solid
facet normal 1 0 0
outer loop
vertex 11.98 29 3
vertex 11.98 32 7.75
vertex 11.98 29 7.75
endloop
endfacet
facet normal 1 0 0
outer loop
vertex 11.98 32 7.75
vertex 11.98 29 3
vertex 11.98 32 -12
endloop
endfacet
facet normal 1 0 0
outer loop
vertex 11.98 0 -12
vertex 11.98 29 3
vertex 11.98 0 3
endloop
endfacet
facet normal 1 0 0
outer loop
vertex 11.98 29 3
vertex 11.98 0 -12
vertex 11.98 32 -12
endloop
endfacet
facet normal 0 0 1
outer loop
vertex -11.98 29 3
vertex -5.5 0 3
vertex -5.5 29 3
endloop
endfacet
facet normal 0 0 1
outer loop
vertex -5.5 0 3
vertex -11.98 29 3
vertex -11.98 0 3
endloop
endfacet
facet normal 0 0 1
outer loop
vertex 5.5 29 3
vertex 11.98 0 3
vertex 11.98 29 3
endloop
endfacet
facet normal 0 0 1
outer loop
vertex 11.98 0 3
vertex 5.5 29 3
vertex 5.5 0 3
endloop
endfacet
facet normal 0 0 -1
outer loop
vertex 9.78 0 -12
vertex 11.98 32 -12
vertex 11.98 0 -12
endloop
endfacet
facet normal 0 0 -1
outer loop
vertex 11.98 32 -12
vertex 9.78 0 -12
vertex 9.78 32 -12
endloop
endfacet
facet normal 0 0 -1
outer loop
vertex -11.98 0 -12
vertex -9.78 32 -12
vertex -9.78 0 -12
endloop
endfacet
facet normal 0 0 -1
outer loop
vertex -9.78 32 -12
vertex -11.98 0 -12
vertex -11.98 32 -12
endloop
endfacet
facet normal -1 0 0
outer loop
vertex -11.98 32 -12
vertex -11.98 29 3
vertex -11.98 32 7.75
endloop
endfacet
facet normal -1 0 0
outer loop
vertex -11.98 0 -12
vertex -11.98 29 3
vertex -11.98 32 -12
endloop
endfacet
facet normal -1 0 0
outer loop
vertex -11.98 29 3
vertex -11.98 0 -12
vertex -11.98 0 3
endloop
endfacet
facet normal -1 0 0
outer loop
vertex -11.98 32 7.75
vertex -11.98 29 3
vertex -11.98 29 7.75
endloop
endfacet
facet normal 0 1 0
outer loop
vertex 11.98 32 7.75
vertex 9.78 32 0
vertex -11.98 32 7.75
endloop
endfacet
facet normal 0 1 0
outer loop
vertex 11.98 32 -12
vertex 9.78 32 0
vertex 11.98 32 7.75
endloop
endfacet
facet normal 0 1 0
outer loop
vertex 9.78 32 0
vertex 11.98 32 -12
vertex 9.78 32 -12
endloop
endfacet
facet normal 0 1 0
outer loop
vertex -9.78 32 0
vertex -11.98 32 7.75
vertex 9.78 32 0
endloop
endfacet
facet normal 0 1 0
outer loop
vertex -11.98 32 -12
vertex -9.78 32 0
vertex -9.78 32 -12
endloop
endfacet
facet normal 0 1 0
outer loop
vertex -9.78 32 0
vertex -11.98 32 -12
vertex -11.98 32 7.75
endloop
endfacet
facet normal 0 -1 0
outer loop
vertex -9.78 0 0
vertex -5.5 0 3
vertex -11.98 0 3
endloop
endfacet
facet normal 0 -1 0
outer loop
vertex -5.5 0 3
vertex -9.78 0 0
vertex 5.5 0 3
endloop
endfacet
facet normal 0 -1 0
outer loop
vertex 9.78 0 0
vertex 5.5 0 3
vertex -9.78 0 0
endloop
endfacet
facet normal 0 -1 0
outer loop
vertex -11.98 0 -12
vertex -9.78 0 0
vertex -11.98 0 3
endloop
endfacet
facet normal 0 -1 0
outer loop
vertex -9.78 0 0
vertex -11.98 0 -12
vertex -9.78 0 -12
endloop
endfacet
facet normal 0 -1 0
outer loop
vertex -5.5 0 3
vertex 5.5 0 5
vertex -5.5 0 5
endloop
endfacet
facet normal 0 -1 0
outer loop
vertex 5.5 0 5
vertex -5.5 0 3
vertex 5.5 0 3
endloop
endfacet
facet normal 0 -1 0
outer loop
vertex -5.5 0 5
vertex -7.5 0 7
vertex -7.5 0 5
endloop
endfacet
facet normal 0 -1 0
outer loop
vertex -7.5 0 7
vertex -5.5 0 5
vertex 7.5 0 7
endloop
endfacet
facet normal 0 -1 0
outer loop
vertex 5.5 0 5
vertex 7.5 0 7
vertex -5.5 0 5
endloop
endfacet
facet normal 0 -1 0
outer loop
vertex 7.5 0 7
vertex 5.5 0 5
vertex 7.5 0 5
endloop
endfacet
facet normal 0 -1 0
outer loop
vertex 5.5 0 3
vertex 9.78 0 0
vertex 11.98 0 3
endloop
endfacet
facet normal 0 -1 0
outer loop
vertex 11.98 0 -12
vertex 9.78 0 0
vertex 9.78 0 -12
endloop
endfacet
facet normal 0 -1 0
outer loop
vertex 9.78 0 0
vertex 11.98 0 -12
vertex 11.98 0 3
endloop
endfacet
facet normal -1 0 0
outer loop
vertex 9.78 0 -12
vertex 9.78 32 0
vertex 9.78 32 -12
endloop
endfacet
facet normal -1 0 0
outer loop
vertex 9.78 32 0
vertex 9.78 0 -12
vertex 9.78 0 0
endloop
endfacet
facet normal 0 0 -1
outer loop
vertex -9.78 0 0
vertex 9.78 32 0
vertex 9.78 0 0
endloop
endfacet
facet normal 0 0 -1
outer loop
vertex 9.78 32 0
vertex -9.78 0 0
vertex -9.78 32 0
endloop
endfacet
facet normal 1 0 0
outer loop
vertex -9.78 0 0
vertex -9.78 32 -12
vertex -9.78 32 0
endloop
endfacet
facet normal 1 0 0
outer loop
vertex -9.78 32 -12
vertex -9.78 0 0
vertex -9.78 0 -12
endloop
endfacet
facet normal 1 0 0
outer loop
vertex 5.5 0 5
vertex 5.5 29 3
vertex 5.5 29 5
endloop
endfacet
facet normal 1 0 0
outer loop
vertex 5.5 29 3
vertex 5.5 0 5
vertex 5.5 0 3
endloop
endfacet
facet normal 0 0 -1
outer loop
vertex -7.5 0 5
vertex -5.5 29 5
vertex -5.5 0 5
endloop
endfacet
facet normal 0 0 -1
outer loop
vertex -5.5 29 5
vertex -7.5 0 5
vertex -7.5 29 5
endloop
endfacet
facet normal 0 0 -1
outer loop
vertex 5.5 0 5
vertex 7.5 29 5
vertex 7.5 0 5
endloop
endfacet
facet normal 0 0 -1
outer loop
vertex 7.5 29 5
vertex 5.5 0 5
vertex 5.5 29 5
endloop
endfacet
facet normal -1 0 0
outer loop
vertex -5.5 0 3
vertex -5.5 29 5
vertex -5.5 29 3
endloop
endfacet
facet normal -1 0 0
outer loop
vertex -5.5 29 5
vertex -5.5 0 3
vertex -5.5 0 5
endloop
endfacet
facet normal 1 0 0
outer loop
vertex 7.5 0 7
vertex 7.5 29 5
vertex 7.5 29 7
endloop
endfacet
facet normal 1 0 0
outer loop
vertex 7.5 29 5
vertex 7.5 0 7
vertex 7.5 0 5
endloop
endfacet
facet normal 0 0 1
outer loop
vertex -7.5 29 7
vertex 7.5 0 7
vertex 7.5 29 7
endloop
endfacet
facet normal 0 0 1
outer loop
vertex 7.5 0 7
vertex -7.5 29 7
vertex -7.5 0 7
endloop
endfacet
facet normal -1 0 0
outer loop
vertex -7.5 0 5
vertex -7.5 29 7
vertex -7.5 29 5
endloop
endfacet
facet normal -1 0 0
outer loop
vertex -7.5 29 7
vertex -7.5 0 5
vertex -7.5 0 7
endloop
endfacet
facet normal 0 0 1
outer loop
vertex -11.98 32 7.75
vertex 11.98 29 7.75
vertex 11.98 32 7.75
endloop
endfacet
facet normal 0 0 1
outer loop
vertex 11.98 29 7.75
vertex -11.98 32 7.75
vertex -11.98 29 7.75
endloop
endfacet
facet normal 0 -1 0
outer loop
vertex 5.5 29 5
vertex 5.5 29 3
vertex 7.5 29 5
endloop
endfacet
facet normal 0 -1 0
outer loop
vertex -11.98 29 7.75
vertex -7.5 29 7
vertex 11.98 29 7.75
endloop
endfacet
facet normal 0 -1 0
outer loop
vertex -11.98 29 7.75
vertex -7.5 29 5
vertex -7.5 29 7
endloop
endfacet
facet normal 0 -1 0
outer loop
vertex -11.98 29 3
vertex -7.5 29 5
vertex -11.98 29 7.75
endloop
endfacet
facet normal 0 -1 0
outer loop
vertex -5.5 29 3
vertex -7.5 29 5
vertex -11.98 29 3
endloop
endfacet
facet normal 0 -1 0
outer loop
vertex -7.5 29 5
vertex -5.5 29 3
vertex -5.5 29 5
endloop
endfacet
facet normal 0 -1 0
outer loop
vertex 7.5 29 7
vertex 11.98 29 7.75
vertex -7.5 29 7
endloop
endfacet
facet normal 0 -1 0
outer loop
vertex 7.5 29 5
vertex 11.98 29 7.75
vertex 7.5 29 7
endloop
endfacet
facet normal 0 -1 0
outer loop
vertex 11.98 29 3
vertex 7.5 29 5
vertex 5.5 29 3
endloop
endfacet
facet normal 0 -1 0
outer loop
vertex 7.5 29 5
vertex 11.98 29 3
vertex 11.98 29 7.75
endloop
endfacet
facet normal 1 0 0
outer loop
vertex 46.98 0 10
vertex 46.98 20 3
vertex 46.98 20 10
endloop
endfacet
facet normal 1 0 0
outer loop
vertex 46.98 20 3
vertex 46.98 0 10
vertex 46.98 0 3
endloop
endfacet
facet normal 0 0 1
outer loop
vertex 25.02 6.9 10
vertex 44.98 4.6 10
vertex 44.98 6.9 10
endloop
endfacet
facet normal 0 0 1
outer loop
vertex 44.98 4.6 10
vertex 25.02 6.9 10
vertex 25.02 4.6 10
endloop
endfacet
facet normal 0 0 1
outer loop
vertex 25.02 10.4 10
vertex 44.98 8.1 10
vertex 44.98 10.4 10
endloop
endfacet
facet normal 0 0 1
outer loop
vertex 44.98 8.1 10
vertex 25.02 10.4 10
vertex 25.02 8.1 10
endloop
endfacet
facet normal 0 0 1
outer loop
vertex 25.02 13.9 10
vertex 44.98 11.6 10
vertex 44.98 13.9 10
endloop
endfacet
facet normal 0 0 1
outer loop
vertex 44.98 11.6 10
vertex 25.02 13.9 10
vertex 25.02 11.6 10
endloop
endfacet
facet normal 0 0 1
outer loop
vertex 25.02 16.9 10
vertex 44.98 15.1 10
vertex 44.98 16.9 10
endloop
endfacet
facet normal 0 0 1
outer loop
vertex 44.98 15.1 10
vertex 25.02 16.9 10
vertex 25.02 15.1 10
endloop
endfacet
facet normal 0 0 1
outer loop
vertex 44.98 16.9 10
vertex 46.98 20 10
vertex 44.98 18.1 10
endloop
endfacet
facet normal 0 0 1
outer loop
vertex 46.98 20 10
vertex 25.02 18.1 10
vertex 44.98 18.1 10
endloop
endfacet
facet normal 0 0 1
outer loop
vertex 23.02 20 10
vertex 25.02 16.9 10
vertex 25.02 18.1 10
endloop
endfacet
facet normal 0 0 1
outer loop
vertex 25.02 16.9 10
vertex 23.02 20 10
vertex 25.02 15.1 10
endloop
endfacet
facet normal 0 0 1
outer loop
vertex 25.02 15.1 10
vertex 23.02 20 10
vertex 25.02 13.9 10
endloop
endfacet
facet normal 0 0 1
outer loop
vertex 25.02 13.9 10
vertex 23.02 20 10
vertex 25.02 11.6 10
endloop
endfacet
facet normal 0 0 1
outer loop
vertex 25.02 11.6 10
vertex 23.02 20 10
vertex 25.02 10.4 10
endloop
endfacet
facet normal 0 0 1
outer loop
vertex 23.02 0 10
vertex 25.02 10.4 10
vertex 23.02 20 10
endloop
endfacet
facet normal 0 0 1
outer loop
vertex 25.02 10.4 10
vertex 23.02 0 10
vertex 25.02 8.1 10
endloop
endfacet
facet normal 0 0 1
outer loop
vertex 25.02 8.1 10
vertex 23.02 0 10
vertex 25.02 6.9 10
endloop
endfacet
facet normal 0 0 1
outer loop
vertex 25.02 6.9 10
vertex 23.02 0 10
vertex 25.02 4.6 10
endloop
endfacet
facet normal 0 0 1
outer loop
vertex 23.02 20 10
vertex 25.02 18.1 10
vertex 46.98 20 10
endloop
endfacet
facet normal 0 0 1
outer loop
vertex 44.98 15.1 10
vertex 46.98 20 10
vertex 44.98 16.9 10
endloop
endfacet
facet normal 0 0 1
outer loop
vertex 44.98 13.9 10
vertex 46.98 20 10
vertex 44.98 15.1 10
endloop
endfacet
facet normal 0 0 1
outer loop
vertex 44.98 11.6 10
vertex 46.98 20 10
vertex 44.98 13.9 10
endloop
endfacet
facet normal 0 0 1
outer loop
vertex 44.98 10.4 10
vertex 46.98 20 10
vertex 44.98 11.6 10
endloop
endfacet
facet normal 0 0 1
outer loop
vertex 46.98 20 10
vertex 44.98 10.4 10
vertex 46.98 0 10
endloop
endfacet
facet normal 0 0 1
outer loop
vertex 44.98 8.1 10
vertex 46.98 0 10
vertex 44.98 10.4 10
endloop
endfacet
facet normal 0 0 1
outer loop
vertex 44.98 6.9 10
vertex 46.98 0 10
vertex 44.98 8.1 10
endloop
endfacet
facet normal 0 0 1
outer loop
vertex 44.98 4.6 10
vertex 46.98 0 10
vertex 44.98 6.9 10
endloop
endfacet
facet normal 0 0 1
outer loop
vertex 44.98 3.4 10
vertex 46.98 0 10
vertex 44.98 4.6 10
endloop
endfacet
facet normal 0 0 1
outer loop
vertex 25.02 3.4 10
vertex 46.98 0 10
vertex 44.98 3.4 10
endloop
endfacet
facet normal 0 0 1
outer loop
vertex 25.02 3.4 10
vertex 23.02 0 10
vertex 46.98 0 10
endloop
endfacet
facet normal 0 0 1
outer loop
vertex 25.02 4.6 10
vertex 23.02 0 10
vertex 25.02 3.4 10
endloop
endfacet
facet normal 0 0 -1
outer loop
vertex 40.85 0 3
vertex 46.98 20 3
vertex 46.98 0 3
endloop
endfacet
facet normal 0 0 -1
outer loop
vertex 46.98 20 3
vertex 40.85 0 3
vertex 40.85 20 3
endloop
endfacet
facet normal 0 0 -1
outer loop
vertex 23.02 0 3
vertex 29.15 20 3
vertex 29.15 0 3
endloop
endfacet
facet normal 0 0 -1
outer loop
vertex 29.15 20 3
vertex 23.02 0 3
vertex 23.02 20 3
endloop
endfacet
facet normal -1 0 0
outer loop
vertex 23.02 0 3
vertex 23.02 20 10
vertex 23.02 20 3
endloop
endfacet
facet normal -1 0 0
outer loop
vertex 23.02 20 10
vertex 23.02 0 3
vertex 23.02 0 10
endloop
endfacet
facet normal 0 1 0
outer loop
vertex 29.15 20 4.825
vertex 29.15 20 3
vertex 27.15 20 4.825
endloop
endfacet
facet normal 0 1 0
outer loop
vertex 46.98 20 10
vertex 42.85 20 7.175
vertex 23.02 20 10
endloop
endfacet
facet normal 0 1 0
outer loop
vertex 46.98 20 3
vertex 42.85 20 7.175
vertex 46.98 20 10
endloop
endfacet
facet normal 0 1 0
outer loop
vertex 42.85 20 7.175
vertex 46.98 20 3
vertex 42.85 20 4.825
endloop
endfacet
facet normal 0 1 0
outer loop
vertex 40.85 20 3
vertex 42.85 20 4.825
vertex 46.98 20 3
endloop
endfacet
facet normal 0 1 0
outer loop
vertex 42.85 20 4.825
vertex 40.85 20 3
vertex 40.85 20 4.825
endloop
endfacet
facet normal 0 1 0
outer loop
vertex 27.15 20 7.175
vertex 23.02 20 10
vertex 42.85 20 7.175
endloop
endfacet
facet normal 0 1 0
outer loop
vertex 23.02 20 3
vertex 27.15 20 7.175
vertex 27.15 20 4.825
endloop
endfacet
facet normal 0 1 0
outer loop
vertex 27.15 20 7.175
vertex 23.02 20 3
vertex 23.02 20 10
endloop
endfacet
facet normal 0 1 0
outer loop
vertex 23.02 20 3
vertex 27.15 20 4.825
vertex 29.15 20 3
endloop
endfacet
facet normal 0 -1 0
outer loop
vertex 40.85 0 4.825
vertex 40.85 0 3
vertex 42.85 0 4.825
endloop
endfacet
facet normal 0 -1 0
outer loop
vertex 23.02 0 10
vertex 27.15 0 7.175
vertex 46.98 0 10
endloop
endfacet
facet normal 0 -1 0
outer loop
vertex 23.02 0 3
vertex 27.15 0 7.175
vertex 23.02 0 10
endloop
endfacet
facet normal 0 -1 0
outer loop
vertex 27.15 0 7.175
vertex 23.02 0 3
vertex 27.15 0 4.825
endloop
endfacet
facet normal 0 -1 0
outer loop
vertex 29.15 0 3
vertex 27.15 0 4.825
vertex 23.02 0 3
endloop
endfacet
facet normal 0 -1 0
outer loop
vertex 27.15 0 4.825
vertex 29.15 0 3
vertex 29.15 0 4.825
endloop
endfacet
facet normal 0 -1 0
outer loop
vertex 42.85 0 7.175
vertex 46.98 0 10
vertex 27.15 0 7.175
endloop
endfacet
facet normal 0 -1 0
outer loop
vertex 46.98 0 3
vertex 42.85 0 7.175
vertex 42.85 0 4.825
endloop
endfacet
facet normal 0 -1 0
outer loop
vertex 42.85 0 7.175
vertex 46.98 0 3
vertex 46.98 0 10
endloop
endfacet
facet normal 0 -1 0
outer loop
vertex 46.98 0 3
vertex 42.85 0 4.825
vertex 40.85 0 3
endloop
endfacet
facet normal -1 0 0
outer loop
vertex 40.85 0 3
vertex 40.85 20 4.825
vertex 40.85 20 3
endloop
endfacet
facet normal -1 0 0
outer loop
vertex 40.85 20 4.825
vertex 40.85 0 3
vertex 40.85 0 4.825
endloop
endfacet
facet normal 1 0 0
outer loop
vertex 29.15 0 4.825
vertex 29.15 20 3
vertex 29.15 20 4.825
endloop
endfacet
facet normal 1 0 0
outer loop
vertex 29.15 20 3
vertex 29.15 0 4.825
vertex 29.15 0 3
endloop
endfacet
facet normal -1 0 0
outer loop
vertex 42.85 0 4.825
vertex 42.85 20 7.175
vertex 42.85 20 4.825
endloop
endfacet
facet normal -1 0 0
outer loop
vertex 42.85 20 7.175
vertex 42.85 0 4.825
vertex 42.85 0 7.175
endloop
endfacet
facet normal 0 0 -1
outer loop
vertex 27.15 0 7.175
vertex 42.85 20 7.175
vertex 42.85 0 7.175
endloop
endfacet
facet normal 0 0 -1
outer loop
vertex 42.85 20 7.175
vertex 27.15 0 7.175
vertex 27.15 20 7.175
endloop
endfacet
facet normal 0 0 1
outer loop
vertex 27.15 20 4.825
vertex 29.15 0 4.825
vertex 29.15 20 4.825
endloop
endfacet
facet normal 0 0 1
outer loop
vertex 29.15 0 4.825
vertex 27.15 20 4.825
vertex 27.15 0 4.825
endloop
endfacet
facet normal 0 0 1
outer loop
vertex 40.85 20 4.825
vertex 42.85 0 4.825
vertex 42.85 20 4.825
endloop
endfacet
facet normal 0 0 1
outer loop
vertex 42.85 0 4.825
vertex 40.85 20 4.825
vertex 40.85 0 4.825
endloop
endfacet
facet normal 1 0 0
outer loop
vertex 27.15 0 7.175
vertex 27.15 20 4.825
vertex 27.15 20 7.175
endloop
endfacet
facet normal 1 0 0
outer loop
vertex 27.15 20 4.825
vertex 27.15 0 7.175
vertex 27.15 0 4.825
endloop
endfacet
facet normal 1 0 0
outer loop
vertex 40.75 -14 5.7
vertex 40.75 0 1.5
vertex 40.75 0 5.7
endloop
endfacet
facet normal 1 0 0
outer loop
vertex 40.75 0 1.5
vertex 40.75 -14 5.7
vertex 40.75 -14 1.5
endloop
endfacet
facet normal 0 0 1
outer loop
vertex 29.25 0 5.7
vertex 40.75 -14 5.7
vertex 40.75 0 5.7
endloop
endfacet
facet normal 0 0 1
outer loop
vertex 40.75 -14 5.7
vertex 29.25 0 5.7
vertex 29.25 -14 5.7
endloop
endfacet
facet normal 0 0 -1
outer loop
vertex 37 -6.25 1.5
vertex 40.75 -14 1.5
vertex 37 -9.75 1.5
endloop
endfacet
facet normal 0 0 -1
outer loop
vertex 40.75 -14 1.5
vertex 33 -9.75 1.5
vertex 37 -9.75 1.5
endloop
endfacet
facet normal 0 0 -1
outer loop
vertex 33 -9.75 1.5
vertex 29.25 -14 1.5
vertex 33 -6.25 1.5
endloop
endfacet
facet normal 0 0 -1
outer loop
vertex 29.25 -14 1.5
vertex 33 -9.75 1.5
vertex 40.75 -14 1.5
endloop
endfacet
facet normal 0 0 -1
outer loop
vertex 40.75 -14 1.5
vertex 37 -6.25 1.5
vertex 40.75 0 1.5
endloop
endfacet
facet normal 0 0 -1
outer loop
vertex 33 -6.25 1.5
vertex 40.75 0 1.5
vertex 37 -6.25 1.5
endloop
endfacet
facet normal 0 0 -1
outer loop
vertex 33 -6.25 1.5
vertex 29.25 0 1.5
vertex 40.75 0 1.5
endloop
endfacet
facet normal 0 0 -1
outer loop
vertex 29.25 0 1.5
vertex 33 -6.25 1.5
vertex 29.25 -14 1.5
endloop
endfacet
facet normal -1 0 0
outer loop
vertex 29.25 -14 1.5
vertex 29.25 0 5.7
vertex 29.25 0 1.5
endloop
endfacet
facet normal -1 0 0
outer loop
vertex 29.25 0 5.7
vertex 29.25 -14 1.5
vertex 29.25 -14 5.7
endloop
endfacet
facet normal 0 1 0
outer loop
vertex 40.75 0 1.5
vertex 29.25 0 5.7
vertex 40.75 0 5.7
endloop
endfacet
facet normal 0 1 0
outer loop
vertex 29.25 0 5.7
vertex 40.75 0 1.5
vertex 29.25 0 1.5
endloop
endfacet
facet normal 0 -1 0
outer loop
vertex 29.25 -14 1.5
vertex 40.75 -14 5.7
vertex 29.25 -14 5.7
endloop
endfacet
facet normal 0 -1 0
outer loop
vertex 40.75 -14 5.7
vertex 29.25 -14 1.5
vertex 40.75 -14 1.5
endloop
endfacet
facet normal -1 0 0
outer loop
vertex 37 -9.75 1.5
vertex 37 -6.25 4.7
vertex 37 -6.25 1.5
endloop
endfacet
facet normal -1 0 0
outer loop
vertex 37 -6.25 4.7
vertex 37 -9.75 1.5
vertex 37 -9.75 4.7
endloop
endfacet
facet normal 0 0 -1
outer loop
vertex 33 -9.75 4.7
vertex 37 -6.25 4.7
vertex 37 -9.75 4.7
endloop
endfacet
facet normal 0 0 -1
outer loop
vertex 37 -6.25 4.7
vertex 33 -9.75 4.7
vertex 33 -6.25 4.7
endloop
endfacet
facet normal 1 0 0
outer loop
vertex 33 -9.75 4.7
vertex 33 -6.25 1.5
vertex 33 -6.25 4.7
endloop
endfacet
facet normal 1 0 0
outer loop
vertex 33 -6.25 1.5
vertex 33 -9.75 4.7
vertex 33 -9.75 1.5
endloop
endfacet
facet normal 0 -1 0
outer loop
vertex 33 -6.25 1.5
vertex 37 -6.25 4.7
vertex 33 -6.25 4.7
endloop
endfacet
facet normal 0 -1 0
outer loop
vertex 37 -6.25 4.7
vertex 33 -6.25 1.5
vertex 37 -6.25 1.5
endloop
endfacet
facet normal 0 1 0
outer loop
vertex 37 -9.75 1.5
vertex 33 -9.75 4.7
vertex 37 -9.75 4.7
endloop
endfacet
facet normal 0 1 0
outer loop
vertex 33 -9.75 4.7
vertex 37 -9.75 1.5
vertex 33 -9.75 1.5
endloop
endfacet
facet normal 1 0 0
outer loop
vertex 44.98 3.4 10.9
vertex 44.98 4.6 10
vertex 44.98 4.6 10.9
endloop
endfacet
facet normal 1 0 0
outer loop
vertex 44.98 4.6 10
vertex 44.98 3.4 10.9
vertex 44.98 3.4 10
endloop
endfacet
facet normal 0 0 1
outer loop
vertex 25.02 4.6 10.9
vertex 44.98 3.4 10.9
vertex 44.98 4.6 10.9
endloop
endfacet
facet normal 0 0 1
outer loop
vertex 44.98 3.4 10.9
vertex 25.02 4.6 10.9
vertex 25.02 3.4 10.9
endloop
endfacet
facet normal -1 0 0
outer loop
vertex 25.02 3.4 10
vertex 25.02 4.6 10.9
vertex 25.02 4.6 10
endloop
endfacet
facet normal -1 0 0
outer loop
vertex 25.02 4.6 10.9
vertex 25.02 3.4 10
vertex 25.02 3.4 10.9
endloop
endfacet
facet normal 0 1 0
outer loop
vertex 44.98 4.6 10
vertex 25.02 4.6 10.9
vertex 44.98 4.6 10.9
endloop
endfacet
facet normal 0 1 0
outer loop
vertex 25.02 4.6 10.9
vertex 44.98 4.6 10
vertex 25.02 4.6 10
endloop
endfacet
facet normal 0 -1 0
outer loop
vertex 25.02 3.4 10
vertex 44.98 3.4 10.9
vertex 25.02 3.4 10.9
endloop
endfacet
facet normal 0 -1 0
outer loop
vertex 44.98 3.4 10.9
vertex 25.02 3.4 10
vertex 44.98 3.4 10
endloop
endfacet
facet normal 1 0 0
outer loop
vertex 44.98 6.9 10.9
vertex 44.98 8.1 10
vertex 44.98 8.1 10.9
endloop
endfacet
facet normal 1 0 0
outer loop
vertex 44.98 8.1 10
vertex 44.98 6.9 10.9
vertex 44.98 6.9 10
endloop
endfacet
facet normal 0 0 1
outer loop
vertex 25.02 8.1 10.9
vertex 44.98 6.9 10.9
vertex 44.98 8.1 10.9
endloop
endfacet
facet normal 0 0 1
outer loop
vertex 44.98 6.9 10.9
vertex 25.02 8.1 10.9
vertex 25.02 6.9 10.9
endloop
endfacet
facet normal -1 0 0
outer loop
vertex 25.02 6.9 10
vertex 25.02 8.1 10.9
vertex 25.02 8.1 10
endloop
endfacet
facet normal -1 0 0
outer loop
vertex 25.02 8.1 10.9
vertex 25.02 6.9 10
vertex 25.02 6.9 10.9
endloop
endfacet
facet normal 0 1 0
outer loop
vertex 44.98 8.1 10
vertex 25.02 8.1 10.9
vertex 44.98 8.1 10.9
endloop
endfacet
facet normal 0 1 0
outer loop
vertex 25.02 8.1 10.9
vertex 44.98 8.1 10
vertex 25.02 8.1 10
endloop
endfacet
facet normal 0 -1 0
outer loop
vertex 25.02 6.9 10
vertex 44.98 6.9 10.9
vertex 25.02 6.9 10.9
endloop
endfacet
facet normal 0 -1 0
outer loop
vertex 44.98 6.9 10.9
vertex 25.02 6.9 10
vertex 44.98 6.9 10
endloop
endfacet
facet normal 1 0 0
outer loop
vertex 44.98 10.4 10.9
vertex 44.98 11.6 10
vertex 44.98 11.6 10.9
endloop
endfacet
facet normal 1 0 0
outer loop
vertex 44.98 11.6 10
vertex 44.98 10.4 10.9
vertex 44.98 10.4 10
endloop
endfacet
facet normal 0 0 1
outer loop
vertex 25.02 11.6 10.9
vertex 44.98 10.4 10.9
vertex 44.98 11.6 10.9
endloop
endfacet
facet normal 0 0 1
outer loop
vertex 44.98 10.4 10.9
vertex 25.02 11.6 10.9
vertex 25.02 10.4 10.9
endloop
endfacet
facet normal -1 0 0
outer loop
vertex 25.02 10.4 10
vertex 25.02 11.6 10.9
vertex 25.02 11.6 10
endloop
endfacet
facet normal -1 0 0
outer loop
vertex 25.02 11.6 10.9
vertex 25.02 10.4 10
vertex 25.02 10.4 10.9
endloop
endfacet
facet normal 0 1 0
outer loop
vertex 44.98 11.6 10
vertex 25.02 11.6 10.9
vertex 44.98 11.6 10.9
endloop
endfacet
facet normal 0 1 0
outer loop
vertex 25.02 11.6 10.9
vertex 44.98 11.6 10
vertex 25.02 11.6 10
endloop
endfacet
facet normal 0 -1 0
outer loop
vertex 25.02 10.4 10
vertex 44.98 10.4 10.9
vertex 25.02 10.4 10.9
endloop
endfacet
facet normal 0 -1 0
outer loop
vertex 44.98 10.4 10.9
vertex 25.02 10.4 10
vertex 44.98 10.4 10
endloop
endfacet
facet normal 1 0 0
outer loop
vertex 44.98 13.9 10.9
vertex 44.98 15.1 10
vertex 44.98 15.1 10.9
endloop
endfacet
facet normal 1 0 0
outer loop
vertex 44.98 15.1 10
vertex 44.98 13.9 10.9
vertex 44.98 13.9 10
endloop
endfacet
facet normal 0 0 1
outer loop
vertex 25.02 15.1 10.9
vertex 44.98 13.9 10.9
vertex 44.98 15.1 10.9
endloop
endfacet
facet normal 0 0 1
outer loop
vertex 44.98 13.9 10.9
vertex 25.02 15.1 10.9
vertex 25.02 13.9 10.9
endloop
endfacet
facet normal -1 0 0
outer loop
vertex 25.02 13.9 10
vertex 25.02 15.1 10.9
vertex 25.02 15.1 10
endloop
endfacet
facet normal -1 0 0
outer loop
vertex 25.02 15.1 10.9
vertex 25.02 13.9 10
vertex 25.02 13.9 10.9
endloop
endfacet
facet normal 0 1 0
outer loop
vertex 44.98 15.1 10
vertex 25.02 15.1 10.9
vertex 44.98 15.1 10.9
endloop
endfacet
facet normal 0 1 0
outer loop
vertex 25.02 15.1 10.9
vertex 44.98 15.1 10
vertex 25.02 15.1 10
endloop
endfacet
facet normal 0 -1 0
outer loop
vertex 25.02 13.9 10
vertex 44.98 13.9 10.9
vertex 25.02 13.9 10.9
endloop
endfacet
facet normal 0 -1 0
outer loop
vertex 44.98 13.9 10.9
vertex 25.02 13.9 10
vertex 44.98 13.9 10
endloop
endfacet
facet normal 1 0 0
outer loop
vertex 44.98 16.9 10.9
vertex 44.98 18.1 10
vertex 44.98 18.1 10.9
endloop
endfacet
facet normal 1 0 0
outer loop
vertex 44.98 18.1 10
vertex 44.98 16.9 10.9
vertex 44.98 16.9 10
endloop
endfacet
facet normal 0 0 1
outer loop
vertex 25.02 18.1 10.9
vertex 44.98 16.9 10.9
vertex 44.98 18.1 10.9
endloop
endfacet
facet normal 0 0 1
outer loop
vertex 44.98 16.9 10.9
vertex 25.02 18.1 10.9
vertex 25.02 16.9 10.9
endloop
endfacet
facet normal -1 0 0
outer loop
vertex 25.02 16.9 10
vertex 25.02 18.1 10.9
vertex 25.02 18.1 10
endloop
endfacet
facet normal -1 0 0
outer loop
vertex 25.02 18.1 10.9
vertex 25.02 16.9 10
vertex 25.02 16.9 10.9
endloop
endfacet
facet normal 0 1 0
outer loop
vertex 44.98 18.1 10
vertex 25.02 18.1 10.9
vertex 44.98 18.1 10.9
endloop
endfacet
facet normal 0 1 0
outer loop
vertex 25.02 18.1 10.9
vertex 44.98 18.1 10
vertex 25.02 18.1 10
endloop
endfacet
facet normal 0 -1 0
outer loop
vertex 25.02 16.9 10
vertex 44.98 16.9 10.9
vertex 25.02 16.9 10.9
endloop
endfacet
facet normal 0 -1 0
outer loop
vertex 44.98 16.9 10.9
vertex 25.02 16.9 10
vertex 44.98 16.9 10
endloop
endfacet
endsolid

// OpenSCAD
// ==============================================================================
// Kia EV6 / E-GMP V2L Exterior Cable Lock - OpenSCAD Parametric Source
// Calibrated from User Caliper Measurements
// ==============================================================================

// Dimensional Constants (mm)
tower_width = 19.06;        // [A3]
tower_length = 36.75;      // [B1]
tooth_dist = 8.73; // [C2]
tooth_width = 2.0;  // [C3]
tooth_height = 2.7;// [C4]
slide_stroke = 8.5;      // [B3]
clearance_slip = 0.35;  // FDM print clearance

// Modules
module saddle_base() {
    difference() {
        translate([0, 16, -4.5]) cube([23.96, 32, 15], center=true);
        translate([0, 16, -6.5]) cube([19.56, 34, 13], center=true);
    }
    translate([0, 16, 4]) cube([11, 32, 2], center=true);
    translate([0, 16, 6]) cube([15, 32, 2], center=true);
    translate([0, 30.5, 5]) cube([23.96, 3, 5.5], center=true);
}

module sliding_deadbolt() {
    difference() {
        translate([0, 10, 6.5]) cube([23.96, 20, 7], center=true);
        translate([0, 10, 4]) cube([11.7, 22, 3.35], center=true);
        translate([0, 10, 6]) cube([15.7, 22, 2.35], center=true);
    }
    difference() {
        translate([0, -7, 3.6]) cube([11.5, 14, 4.2], center=true);
        translate([0, -8, 3.1]) cube([4, 3.5, 3.2], center=true);
    }
    for (y = [4, 7.5, 11, 14.5, 17.5]) {
        translate([0, y, 10.45]) cube([19.96, 1.2, 0.9], center=true);
    }
}

saddle_base();
translate([35, 0, 0]) sliding_deadbolt();
